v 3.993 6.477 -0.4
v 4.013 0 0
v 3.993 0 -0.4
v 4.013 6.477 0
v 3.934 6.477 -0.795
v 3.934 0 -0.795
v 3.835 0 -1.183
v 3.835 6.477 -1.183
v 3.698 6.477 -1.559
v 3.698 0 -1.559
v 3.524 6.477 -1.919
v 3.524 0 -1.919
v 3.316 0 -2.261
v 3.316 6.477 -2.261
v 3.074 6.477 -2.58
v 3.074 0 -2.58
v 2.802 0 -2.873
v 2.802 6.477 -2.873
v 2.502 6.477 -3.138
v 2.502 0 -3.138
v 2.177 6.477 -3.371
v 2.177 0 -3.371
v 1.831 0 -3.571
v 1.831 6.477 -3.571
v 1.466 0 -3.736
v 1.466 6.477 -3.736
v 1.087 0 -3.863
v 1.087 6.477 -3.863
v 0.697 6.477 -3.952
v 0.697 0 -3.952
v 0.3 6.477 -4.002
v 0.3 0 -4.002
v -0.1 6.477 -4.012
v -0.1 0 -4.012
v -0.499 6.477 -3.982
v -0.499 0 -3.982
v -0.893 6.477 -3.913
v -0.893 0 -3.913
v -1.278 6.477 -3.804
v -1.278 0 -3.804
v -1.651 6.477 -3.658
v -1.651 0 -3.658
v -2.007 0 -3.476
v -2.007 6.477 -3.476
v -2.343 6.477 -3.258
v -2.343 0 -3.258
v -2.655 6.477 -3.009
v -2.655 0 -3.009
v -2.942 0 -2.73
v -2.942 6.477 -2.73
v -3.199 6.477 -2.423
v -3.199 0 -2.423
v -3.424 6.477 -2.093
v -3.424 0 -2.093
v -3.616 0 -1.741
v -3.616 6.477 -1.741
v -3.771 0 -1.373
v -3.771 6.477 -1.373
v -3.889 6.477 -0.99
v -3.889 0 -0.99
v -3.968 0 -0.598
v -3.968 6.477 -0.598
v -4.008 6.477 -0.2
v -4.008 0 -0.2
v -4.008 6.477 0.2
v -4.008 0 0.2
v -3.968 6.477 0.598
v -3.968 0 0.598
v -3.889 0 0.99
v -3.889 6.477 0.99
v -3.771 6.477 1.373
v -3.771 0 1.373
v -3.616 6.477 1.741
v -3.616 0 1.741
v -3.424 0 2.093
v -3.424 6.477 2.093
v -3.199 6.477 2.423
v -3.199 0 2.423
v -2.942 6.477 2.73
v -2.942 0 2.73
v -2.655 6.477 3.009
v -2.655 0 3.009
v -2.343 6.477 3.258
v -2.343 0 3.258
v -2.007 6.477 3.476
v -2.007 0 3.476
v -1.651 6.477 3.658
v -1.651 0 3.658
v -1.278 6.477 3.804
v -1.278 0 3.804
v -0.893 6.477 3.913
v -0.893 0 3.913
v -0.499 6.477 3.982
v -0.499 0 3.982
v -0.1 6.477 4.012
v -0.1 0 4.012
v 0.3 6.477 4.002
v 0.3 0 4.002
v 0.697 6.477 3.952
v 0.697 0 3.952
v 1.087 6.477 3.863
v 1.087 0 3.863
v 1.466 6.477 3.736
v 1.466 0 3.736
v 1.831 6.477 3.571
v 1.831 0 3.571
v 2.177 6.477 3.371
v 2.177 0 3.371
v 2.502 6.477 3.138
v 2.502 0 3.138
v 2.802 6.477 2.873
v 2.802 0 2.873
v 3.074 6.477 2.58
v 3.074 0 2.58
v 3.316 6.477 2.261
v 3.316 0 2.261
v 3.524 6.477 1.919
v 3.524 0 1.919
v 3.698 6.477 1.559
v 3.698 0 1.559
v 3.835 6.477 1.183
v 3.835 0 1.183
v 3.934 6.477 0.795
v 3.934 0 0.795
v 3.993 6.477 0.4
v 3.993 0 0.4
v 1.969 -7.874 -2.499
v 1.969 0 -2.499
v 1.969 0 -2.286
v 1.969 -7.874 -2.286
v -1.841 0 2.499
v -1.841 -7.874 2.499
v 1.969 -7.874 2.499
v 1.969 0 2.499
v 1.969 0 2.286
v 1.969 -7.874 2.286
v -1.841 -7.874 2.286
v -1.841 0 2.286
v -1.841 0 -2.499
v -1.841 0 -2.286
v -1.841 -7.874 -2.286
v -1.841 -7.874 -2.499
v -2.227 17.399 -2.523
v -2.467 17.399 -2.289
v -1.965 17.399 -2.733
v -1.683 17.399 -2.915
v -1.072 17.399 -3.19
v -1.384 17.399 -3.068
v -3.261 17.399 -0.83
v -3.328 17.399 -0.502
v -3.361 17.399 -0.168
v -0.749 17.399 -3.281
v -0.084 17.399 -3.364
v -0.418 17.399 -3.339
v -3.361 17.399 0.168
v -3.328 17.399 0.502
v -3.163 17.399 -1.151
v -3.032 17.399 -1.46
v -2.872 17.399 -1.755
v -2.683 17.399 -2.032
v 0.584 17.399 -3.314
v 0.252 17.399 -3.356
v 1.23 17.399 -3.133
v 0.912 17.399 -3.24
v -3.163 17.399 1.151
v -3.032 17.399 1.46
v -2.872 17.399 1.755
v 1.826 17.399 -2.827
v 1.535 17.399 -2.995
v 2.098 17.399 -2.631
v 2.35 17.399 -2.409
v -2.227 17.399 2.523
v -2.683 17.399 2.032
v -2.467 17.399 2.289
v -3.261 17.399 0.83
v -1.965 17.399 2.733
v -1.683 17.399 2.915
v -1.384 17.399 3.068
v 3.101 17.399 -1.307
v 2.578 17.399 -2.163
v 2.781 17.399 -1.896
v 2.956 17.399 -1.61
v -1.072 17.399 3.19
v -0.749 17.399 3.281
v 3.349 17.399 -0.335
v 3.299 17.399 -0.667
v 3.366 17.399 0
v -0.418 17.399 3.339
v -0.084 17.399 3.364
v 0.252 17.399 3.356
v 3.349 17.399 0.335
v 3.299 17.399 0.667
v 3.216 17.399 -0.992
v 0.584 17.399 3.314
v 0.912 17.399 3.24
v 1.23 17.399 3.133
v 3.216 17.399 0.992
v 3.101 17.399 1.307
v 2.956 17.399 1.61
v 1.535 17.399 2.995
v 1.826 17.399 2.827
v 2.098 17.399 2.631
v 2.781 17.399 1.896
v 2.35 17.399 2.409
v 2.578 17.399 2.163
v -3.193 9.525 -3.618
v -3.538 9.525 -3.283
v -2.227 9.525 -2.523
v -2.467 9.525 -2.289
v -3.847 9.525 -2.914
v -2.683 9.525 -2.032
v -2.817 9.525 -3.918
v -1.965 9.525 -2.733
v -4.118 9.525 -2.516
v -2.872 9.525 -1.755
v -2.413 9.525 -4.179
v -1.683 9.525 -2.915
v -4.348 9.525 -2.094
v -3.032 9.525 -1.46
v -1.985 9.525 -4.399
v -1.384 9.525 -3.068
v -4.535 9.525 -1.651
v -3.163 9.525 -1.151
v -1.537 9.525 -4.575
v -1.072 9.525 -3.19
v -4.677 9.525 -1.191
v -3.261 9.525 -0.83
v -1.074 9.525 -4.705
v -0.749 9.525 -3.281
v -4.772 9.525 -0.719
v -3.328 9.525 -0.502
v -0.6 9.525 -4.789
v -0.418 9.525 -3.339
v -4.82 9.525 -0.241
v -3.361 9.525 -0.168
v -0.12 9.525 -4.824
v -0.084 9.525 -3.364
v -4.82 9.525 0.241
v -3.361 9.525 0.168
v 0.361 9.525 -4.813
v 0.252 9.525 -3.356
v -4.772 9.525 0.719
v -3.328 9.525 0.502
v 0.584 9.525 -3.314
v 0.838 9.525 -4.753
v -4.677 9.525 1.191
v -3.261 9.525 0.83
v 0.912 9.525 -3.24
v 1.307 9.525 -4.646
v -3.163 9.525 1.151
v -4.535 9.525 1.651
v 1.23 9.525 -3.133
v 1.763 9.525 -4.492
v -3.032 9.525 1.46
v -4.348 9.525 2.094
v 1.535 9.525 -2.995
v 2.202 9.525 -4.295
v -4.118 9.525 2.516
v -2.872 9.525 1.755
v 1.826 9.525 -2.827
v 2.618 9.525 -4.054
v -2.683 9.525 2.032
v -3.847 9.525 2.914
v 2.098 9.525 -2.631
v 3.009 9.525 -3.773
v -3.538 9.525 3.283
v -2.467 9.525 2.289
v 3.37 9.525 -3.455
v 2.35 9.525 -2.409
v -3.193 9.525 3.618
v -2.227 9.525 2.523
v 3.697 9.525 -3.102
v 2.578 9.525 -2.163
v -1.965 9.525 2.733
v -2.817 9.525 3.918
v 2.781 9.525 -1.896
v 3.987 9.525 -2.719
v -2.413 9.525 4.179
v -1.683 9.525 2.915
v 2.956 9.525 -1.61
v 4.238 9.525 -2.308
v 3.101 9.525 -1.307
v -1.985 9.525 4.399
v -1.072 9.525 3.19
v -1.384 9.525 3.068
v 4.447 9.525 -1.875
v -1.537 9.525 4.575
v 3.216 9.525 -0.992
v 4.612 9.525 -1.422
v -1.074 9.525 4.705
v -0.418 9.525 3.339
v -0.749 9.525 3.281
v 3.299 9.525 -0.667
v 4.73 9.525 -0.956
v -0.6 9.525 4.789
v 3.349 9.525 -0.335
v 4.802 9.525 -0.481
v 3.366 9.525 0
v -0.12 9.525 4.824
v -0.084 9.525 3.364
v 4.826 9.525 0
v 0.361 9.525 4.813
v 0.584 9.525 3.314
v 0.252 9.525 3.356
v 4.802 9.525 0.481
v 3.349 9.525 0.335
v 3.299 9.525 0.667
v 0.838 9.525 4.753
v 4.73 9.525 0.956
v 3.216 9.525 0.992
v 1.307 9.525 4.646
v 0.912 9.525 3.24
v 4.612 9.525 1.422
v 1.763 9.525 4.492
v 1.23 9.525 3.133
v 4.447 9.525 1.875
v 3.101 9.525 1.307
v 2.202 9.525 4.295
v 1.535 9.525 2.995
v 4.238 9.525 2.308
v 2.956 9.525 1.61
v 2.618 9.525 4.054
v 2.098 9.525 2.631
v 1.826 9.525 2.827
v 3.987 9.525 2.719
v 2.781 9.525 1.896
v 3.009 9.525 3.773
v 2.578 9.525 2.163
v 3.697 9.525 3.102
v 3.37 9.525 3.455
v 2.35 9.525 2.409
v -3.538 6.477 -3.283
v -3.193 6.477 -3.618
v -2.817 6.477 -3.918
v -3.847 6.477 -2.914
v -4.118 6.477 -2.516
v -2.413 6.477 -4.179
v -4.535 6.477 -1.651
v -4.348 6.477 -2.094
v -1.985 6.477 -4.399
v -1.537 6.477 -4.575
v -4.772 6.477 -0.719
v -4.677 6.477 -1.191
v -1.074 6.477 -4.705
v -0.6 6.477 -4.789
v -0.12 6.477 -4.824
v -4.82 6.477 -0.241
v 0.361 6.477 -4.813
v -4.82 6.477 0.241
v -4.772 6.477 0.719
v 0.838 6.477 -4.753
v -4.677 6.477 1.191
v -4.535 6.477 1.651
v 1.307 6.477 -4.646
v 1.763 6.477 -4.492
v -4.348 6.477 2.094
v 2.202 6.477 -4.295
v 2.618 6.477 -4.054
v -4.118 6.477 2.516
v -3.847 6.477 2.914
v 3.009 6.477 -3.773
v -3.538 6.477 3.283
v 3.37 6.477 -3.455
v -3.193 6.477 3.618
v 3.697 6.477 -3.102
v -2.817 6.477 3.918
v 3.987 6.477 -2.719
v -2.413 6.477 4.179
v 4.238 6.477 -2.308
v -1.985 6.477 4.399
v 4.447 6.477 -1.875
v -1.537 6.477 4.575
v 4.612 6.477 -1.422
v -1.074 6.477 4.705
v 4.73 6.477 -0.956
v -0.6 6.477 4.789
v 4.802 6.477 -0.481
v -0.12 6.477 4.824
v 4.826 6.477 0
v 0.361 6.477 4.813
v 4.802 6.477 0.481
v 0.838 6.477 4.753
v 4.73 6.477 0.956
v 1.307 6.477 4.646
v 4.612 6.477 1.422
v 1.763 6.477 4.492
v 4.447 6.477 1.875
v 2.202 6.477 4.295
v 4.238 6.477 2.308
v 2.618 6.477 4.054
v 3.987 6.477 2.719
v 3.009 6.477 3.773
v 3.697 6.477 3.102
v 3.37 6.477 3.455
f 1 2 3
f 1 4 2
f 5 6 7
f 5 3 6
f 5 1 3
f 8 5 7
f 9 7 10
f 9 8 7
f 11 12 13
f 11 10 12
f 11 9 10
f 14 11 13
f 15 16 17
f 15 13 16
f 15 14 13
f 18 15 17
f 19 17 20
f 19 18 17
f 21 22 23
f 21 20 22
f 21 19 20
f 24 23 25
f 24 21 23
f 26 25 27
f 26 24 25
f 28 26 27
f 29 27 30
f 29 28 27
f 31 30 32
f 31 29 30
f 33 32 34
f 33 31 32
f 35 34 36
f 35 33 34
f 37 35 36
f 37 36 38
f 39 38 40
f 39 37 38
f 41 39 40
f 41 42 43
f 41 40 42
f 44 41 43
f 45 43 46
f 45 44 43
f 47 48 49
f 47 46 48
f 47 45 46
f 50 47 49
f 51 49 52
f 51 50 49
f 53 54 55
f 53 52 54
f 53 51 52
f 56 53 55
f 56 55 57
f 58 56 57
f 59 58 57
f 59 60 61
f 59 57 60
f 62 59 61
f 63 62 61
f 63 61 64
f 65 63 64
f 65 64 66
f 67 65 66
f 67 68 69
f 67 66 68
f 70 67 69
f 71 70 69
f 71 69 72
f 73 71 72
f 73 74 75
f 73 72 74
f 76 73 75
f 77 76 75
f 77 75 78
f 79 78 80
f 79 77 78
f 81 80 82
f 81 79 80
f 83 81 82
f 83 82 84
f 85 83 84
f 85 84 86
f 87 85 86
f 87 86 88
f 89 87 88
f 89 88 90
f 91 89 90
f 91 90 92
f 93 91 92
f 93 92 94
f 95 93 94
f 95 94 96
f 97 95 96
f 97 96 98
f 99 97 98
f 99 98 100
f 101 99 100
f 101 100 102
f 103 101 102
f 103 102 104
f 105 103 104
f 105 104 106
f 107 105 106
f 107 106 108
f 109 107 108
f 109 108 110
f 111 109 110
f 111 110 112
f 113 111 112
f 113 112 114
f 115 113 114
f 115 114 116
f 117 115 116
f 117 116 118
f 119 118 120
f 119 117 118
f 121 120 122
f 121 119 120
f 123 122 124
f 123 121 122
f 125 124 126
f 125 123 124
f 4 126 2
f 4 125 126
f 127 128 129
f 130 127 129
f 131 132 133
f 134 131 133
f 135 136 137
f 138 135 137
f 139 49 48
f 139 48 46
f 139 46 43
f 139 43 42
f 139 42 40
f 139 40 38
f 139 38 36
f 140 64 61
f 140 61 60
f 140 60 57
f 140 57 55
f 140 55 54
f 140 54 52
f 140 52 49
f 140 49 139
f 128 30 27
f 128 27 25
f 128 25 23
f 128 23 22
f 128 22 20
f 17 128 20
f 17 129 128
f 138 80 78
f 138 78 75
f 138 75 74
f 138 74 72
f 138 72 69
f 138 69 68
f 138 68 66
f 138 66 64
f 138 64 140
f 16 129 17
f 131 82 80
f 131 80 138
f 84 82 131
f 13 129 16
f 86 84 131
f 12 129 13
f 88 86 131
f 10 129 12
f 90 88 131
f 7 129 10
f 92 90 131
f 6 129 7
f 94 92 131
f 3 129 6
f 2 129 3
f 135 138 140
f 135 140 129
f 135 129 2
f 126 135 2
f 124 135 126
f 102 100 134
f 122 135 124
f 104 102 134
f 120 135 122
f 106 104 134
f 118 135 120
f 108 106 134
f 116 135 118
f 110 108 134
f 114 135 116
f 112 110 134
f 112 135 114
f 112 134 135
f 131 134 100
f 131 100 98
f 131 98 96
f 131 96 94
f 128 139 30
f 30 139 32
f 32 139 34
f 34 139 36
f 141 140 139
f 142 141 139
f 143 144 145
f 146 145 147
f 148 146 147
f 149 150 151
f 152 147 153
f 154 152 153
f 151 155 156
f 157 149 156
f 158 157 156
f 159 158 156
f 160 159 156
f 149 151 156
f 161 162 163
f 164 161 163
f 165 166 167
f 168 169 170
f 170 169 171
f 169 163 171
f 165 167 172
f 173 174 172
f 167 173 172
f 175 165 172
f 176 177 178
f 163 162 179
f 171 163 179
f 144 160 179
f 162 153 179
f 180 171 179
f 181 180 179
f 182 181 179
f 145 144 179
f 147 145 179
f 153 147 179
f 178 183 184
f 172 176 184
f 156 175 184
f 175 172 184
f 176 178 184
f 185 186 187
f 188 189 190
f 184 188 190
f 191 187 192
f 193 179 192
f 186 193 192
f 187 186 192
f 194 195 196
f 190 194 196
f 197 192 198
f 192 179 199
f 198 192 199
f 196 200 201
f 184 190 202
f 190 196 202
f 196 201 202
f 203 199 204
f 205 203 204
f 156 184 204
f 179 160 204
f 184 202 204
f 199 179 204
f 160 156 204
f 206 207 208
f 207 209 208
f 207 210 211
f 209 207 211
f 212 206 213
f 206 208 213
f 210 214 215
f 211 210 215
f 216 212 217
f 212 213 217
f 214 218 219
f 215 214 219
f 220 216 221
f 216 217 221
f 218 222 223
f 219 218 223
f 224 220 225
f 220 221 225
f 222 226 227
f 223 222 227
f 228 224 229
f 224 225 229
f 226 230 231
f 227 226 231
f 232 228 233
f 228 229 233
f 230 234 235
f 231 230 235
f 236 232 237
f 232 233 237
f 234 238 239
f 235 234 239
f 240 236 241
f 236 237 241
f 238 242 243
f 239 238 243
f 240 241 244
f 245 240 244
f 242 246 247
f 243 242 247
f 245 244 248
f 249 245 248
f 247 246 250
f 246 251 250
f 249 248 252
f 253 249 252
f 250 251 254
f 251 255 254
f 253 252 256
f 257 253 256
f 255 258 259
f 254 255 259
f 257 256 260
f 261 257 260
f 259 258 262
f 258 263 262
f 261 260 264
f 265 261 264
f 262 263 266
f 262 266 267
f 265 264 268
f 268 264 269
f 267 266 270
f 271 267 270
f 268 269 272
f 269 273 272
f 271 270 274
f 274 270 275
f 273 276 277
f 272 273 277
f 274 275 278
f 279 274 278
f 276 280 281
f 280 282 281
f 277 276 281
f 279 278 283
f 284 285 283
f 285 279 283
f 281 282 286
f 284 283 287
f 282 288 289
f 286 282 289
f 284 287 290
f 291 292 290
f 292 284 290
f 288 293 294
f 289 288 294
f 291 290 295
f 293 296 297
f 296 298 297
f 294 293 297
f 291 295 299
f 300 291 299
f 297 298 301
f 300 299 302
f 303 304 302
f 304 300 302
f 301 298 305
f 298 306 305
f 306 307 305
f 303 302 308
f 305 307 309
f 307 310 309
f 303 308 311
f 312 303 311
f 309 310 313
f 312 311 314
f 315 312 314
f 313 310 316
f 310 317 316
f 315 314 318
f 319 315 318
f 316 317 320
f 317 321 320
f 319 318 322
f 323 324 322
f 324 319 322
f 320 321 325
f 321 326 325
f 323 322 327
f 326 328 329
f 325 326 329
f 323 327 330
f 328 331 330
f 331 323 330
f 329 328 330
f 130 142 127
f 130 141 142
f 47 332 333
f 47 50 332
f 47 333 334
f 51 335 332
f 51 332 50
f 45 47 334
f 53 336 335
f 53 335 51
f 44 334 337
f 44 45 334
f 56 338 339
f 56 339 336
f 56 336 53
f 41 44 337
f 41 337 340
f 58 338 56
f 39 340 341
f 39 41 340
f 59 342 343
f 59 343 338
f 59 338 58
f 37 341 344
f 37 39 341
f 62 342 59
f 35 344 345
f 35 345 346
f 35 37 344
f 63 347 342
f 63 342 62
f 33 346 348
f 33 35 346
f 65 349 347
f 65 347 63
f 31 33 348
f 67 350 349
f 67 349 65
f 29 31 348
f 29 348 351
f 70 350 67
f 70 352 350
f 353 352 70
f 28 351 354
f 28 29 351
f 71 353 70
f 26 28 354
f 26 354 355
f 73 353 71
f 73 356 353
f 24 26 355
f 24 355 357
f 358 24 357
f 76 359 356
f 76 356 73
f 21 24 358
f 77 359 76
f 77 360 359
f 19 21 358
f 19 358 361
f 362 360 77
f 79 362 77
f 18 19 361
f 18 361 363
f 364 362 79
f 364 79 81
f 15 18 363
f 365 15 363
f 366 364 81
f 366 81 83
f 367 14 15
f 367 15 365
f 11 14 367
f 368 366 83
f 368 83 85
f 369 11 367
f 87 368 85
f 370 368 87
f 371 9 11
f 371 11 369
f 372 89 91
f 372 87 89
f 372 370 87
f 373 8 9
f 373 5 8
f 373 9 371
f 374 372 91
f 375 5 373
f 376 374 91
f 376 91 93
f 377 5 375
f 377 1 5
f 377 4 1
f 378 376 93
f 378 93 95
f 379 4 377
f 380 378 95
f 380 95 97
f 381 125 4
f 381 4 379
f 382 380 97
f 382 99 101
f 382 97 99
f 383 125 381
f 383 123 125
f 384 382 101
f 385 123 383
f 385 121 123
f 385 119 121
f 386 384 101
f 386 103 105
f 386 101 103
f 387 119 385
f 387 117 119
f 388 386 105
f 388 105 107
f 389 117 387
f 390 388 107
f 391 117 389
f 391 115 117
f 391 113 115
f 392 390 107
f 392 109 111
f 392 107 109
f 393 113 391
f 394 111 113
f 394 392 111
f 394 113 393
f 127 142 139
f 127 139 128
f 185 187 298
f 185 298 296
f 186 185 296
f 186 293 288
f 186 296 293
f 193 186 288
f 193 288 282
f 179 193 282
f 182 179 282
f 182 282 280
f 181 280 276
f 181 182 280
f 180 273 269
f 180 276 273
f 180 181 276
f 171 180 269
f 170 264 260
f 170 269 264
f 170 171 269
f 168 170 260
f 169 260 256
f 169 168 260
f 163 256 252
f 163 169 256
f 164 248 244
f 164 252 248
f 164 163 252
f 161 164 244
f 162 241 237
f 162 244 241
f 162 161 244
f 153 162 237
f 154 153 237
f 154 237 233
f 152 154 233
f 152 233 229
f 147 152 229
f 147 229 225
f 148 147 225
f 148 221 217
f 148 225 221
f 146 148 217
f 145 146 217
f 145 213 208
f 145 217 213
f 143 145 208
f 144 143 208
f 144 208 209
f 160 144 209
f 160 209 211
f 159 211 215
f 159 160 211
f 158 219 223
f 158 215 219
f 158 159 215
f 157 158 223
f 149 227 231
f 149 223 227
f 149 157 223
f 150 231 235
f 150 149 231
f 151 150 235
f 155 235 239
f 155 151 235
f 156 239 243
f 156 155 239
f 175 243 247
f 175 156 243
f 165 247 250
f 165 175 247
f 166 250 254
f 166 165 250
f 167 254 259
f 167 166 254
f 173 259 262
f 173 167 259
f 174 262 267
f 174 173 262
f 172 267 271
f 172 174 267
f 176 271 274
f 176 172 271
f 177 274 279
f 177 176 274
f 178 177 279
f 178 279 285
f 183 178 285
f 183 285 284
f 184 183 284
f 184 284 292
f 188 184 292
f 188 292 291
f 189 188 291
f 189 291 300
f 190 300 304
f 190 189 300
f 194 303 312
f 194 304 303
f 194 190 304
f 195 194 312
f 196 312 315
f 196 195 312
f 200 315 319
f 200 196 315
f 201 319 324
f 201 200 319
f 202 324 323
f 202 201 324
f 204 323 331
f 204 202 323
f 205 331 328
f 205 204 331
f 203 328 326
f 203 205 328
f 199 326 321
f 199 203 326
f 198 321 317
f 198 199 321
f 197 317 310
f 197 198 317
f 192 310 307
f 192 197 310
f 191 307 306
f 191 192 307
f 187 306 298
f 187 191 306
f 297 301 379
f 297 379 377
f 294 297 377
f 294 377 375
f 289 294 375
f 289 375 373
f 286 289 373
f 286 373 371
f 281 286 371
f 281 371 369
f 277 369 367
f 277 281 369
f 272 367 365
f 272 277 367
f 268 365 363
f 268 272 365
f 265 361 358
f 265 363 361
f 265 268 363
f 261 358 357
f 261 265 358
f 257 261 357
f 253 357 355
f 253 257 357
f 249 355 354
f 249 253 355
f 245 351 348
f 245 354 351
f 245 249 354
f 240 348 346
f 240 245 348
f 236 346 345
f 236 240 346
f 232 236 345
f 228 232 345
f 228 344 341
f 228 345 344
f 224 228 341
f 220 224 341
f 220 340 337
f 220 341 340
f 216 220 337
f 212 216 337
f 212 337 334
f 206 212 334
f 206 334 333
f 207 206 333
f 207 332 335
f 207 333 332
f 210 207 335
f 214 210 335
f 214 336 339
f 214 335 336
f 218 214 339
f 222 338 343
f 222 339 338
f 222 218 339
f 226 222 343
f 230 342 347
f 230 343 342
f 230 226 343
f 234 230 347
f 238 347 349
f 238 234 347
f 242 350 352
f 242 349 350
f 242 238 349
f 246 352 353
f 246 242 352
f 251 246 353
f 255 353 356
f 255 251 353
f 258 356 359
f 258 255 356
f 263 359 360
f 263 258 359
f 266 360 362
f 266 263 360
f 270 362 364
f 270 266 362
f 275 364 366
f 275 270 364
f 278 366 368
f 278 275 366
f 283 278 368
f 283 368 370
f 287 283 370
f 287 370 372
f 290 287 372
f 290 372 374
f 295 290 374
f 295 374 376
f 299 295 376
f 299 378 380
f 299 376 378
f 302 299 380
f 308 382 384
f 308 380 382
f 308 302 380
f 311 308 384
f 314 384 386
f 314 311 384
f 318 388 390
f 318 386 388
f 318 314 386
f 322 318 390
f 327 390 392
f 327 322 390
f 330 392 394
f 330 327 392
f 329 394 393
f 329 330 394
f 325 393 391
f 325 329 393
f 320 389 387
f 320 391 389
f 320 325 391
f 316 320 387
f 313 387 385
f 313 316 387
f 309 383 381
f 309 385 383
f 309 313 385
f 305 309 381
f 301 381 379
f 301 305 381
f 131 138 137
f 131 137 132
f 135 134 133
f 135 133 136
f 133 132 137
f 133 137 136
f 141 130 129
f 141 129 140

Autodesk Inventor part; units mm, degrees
ref_plane "YZ Plane" through (0, 0, 0) normal (1, 0, 0) x (0, 1, 0)
ref_plane "XZ Plane" through (0, 0, 0) normal (0, 1, 0) x (-1, 0, 0)
ref_plane "XY Plane" through (0, 0, 0) normal (0, 0, 1) x (1, 0, 0)
sketch "Sketch1" plane through (0, 0, 0) normal (0, 0, 1) x (1, 0, 0)
  line L0 (0, 0) -> (4.0132, 0)
  line L1 (4.0132, 0) -> (4.0132, 6.477)
  line L2 (4.0132, 6.477) -> (0, 6.477)
  line L3 (0, 6.477) -> (0, 0)
  line L4 (0, 6.477) -> (4.826, 6.477)
  line L5 (4.826, 6.477) -> (4.826, 9.525)
  line L6 (4.826, 9.525) -> (0, 9.525)
  line L7 (0, 9.525) -> (0, 6.477)
  line L8 (0, 9.525) -> (3.3655, 9.525)
  line L9 (3.3655, 9.525) -> (3.3655, 17.399)
  line L10 (3.3655, 17.399) -> (0, 17.399)
  line L11 (0, 17.399) -> (0, 9.525)
  dimension "d0" = 4.0132
  dimension "d1" = 6.477
  dimension "d2" = 4.826
  dimension "d3" = 3.048
  dimension "d4" = 3.3655
  dimension "d5" = 7.874
revolve "Revolution1" add sketch "Sketch1" angle 360 about axis through (0, 17.399, 0) along (0, -1, 0)
thread "Thread1" size "5/16-18 UNC" class "2A" standard "ANSI Unified Screw Threads" full length
sketch "Sketch2" plane through (0, 0, 0) normal (0, -1, 0) x (1, 0, 0)
  line L0 (1.9693, -2.286) -> (-1.8407, -2.286)
  line L1 (-1.8407, -2.286) -> (-1.8407, -2.4989)
  line L2 (-1.8407, -2.4989) -> (1.9693, -2.4989)
  line L3 (1.9693, -2.4989) -> (1.9693, -2.286)
  line L4 (3.0926, 0) -> (-3.1405, 0)
  line L5 (1.9693, 2.286) -> (-1.8407, 2.286)
  line L6 (-1.8407, 2.286) -> (-1.8407, 2.4989)
  line L7 (-1.8407, 2.4989) -> (1.9693, 2.4989)
  line L8 (1.9693, 2.4989) -> (1.9693, 2.286)
  point P0 (0, 0)
  dimension "d9" = 3.81
  dimension "d10" = 2.286
extrude "Extrusion1" add sketch "Sketch2" along normal blind 7.874
properties part number "PushSwitchBody" material "Stainless Steel"
